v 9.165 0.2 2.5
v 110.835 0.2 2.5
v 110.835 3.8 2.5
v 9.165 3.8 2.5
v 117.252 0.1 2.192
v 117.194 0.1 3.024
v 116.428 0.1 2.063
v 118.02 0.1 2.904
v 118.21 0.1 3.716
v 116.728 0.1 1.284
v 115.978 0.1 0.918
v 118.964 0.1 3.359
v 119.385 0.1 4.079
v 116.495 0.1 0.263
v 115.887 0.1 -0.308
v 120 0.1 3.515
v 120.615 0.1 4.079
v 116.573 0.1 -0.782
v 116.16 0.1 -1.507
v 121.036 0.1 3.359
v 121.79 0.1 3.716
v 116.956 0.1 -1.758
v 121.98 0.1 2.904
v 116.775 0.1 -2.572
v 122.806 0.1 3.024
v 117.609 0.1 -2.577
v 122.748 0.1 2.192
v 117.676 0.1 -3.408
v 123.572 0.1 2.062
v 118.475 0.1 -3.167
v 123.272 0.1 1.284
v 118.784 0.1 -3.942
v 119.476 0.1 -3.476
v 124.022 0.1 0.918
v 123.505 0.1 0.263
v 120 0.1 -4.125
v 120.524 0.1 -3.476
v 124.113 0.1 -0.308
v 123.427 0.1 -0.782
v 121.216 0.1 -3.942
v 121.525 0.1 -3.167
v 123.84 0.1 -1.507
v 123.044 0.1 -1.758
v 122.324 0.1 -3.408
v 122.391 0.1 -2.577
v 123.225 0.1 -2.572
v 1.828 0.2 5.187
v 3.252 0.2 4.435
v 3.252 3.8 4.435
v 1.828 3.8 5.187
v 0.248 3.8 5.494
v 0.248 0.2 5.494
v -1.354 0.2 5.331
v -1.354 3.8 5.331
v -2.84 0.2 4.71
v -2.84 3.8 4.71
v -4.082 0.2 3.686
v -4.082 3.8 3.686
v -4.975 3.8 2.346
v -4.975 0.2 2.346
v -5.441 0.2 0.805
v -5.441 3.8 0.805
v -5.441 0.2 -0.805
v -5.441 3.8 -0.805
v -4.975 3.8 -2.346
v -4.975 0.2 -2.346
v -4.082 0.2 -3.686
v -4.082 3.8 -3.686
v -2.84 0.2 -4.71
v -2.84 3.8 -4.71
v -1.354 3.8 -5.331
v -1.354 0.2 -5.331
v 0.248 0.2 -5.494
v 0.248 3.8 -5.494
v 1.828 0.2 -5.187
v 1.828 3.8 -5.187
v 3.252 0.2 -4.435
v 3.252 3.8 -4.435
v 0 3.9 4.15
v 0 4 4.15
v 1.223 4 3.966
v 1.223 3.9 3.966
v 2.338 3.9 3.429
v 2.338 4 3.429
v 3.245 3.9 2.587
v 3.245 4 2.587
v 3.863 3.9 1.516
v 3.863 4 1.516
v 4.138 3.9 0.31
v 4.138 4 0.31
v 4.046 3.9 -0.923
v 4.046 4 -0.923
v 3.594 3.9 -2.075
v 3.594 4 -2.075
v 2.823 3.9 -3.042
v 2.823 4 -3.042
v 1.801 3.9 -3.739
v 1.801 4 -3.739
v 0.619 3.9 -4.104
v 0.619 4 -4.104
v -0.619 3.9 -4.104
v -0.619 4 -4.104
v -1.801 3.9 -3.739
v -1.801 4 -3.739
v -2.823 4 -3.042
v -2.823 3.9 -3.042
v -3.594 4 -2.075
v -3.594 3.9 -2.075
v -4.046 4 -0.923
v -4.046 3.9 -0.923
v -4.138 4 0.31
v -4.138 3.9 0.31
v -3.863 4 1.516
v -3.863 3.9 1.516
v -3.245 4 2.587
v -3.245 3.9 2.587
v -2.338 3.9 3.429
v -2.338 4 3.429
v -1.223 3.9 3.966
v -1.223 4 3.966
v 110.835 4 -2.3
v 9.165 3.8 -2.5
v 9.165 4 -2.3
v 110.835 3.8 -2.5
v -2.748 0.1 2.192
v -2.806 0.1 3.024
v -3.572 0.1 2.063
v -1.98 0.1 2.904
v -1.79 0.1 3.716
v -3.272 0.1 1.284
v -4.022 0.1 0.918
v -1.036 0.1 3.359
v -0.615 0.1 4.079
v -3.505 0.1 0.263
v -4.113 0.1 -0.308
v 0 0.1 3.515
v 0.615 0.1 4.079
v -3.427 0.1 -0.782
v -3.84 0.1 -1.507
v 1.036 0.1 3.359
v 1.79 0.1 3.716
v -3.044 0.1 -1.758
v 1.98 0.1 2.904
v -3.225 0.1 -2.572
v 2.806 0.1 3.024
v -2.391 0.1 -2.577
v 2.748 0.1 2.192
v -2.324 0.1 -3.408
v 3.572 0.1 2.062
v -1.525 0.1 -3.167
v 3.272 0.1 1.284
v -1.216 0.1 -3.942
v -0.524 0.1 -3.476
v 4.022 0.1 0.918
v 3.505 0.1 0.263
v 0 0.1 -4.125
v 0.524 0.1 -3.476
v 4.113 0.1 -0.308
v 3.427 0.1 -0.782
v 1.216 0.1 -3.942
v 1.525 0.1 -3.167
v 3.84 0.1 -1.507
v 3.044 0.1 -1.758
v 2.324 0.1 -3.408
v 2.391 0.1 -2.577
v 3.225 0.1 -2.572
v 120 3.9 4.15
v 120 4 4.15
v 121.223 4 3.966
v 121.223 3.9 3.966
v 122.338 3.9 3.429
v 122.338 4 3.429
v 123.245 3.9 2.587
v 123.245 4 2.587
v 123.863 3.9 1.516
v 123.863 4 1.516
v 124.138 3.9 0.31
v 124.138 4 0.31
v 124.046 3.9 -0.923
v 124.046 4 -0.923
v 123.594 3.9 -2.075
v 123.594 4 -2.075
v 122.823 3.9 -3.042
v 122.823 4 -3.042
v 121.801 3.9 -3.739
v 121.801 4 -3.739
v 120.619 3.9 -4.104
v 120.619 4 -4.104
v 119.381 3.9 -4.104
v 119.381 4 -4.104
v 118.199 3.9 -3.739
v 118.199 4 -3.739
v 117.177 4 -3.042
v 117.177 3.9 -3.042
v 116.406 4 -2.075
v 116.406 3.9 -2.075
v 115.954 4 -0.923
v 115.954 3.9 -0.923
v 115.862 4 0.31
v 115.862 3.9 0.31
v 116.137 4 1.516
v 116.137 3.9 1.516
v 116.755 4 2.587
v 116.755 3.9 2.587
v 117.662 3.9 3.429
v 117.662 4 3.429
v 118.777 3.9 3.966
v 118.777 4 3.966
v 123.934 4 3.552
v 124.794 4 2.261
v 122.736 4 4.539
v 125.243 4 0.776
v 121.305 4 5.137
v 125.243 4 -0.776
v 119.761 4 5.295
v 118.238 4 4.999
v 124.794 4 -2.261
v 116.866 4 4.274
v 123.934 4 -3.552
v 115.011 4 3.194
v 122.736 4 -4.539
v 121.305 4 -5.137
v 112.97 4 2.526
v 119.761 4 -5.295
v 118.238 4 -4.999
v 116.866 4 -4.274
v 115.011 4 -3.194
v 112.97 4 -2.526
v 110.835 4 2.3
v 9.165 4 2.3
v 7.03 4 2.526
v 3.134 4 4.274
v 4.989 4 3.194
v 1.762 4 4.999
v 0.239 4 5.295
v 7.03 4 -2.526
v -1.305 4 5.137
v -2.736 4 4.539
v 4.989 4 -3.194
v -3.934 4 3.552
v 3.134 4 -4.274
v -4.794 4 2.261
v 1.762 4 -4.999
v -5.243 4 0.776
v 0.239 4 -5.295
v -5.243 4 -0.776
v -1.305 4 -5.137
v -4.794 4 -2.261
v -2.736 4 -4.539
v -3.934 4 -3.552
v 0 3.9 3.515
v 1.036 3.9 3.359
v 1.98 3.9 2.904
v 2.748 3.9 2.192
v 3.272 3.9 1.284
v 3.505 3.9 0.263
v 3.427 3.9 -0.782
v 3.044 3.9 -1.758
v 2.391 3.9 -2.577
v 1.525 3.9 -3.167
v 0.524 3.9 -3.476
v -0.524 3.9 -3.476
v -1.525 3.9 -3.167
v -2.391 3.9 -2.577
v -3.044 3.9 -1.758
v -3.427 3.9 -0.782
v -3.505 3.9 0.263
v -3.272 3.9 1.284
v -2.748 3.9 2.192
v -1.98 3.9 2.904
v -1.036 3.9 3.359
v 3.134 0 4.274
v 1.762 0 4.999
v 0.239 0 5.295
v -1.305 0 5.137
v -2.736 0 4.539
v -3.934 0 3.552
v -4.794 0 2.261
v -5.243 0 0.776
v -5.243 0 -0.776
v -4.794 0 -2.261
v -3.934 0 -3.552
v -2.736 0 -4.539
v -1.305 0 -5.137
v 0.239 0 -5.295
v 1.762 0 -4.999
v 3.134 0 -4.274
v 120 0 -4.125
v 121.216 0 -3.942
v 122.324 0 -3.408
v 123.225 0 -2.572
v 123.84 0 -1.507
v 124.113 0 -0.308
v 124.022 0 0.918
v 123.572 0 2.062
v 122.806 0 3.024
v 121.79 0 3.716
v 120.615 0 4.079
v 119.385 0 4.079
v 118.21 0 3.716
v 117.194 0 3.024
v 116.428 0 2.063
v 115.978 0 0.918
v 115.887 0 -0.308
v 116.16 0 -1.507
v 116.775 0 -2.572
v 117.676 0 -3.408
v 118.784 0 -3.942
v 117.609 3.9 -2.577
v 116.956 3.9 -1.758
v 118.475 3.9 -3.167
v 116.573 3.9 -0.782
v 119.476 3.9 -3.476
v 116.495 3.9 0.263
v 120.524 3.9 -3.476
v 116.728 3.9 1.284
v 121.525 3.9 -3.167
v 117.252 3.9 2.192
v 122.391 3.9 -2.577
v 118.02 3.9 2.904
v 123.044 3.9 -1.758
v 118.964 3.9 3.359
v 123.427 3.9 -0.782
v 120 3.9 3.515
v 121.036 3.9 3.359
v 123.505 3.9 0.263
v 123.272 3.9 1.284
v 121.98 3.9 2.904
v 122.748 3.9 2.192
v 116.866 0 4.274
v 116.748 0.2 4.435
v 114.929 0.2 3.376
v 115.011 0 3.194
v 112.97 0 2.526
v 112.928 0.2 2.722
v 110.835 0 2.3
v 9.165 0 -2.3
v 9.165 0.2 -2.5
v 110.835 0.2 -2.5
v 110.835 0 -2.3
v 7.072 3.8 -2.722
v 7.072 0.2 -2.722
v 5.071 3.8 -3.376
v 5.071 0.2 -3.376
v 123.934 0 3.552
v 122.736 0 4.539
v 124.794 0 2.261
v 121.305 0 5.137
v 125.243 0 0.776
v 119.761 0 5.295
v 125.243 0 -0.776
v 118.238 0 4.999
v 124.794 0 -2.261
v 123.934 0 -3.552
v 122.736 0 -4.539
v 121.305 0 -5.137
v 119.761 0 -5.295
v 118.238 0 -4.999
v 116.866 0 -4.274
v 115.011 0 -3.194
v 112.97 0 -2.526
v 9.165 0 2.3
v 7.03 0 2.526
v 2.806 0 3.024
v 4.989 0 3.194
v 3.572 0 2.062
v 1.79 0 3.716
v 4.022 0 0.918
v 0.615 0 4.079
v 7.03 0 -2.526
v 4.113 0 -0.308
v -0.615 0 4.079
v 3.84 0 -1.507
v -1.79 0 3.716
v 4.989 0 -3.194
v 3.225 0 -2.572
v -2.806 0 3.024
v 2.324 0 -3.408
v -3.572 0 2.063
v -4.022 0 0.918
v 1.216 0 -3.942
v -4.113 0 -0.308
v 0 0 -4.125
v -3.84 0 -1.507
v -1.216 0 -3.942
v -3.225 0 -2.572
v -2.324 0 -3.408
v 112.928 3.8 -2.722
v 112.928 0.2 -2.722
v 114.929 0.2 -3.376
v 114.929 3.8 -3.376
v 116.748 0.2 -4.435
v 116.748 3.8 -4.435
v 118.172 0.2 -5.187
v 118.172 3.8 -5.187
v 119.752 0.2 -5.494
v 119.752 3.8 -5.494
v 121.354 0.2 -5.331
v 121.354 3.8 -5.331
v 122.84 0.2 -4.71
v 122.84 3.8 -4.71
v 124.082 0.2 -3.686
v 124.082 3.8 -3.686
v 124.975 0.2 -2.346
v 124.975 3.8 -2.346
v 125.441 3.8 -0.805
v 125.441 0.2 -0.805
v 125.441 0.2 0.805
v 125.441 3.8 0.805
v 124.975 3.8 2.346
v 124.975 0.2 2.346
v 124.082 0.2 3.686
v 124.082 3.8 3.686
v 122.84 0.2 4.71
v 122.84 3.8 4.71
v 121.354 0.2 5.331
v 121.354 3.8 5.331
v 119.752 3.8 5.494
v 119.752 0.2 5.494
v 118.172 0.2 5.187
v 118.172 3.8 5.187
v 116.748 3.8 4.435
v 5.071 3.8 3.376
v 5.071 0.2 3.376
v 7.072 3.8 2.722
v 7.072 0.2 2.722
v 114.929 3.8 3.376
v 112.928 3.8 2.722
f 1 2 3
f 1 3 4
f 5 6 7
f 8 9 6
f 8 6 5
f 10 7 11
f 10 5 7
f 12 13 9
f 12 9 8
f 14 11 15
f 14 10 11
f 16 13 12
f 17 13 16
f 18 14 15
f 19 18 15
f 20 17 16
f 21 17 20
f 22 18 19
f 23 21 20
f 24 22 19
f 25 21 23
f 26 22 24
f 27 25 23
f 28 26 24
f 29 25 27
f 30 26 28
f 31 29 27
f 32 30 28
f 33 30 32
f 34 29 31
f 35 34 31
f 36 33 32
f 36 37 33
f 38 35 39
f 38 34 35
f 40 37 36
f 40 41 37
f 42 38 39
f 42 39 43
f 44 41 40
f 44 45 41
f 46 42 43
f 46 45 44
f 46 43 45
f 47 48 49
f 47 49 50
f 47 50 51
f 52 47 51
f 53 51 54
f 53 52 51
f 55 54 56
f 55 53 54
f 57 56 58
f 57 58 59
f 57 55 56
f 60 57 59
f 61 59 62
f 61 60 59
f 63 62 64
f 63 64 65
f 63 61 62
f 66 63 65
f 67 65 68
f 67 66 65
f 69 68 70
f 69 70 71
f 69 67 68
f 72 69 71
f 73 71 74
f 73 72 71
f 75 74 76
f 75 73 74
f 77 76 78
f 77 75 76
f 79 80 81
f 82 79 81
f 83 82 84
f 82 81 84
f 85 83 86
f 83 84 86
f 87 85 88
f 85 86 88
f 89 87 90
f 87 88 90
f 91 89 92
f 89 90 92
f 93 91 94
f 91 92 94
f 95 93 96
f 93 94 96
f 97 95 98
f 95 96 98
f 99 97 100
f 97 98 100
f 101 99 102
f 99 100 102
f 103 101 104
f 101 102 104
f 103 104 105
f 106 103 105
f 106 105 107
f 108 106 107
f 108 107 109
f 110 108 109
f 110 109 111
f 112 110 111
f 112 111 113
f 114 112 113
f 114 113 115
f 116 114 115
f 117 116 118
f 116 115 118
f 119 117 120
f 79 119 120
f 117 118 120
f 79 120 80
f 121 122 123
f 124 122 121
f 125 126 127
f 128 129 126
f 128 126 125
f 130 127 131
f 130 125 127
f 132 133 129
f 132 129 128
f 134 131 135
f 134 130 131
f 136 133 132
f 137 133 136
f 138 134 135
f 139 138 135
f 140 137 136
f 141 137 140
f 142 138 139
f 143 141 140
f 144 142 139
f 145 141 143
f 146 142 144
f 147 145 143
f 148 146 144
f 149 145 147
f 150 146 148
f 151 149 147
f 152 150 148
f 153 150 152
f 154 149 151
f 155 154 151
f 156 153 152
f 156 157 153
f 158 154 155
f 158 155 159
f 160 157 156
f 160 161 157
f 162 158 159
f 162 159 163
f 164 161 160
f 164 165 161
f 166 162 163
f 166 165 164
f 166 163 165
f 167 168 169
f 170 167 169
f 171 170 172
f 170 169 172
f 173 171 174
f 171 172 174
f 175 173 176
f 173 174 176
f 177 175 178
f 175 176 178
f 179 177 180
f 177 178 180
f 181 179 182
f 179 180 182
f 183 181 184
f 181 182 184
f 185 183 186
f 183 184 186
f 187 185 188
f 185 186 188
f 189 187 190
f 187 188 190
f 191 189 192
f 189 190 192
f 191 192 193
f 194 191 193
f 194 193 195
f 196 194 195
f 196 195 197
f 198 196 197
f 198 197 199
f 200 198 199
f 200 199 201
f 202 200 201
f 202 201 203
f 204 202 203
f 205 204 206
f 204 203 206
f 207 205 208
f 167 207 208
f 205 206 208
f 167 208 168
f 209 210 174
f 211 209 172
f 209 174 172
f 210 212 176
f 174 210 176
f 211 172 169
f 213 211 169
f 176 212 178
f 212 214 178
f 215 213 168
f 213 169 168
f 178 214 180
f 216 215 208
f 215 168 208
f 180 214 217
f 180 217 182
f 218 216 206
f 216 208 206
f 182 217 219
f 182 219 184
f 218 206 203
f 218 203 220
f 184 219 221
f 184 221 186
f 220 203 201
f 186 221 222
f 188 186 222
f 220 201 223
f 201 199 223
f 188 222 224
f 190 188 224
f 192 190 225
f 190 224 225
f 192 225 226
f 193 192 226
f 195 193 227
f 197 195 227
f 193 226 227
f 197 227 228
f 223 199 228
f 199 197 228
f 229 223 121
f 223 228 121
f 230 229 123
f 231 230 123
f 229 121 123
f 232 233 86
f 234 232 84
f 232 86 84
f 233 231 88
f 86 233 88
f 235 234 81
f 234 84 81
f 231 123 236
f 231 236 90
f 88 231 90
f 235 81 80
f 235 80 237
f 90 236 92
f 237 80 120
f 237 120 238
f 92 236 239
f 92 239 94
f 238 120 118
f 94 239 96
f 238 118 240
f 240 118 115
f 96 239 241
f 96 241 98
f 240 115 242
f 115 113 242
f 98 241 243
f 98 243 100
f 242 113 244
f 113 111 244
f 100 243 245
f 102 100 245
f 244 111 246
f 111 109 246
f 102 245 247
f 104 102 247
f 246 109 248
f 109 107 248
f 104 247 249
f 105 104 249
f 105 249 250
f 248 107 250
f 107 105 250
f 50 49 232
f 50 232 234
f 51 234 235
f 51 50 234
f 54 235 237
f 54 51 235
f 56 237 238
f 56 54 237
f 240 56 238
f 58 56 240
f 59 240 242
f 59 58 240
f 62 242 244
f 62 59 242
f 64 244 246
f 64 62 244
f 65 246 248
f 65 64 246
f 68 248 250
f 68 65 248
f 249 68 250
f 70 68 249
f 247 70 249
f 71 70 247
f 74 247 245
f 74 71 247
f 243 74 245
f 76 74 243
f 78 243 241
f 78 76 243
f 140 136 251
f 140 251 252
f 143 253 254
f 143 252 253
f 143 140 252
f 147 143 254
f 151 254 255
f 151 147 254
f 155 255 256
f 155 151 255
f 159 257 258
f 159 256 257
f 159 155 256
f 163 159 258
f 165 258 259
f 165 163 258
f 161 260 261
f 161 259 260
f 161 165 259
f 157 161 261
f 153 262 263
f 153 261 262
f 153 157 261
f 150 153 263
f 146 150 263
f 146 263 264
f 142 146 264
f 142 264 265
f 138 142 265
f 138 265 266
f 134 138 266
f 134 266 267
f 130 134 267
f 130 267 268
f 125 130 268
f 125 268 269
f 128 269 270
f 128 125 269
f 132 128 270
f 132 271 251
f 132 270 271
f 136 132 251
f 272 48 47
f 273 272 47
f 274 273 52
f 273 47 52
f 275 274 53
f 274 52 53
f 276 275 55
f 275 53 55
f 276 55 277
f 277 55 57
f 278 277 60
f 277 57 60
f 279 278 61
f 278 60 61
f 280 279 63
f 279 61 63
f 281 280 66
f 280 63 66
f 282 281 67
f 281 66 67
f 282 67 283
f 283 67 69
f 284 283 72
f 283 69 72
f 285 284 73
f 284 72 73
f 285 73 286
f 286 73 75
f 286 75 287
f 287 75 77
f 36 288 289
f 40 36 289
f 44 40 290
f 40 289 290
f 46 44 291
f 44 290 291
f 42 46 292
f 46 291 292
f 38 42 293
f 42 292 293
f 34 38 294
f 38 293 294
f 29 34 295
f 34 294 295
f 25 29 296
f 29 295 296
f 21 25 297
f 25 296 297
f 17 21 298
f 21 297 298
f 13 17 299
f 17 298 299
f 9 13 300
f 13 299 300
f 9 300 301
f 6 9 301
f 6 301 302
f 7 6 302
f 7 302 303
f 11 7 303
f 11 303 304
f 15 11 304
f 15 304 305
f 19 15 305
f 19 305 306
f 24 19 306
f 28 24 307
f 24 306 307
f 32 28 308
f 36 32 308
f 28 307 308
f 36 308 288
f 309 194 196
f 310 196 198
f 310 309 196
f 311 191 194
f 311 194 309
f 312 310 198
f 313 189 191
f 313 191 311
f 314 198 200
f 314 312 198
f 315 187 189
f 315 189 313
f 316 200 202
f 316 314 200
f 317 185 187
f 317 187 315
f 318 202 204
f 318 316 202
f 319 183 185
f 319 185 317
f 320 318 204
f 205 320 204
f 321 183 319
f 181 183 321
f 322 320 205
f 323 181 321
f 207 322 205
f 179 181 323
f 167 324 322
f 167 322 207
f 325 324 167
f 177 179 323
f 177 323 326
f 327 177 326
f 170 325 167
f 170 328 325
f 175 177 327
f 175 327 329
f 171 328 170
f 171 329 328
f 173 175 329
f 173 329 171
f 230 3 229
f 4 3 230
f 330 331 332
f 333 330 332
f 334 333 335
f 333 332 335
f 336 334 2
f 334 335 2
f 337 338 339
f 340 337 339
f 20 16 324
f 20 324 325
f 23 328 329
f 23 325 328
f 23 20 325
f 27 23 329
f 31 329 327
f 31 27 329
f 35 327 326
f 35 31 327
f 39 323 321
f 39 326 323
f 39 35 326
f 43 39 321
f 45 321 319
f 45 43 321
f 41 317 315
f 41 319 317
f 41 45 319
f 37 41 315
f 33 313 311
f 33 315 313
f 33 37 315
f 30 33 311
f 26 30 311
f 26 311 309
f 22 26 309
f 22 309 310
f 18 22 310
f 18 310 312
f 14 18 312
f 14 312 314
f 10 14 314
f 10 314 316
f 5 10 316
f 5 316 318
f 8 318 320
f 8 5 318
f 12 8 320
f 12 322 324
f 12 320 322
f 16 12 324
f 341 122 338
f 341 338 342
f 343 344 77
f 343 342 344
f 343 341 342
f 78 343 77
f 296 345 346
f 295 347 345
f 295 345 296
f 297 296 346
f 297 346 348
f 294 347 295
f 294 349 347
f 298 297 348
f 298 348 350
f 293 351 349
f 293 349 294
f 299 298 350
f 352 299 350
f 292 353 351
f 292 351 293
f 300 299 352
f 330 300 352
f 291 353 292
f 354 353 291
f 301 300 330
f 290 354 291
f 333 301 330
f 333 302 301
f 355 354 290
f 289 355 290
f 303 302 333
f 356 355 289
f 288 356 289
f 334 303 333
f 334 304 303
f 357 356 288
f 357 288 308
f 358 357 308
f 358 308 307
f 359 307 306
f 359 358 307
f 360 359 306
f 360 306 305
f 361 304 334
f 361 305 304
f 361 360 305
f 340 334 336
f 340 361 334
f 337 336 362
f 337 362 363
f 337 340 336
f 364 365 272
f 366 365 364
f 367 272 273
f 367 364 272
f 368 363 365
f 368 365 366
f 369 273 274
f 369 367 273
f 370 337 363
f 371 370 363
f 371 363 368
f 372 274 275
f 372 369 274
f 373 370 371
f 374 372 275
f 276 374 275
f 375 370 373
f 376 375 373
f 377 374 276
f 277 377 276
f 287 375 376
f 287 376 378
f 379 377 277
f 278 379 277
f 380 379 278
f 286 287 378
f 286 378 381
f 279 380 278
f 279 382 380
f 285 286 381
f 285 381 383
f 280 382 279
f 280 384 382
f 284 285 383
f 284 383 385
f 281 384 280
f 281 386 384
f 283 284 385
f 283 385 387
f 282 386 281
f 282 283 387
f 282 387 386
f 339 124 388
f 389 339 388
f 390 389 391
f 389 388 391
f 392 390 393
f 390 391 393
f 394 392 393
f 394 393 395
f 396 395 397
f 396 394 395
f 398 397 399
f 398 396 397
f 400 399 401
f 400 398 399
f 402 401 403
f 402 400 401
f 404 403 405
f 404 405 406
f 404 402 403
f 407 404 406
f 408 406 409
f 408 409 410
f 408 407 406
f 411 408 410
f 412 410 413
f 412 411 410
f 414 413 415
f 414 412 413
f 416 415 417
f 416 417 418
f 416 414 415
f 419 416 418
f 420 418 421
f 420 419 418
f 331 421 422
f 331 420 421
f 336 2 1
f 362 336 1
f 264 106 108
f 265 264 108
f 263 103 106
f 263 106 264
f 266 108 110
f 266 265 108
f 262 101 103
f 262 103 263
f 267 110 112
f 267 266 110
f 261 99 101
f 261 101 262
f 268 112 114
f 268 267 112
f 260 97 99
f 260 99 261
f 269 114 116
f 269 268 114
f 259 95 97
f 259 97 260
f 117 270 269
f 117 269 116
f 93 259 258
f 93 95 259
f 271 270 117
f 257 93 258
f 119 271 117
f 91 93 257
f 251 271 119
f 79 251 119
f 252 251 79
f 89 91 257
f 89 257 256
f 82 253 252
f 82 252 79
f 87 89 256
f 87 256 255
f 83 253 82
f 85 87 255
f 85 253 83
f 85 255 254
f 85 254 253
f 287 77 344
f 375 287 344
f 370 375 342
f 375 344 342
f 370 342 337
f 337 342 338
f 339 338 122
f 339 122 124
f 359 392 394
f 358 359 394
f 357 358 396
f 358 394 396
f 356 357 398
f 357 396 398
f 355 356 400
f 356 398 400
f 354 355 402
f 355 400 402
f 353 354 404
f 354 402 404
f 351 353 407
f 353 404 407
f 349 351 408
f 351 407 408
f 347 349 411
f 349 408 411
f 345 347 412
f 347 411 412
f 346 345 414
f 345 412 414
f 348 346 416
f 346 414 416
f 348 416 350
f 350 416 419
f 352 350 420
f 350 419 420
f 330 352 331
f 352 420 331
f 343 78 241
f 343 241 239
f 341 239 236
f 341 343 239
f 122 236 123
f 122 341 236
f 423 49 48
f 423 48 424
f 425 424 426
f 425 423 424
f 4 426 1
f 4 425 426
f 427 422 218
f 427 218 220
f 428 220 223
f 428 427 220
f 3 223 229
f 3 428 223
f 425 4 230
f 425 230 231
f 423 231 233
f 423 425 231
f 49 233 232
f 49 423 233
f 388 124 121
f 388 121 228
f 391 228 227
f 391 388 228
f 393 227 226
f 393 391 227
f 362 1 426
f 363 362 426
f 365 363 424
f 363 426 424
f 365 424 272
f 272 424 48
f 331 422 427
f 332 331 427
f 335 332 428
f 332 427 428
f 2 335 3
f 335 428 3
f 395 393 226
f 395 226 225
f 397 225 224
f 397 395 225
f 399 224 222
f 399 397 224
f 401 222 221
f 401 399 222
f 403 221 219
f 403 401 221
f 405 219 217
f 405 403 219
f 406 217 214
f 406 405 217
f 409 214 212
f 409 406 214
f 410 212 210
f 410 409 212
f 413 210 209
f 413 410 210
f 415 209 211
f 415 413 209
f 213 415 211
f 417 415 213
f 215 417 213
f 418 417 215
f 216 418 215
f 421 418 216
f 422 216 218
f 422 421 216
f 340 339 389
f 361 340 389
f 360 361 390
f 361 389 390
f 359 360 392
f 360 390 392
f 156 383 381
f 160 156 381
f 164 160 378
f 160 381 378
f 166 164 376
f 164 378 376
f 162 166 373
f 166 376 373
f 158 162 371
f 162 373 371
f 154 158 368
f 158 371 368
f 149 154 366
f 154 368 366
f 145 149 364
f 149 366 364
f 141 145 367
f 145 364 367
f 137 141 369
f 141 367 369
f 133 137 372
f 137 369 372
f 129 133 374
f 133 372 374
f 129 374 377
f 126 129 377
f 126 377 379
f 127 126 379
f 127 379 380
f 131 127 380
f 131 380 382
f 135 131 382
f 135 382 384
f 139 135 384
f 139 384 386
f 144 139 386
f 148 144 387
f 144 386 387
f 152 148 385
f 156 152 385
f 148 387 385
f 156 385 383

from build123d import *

# Parameters (mm, degrees)
SKETCH_1_R          = 3.515
EXTRUDE_1_DEPTH     = 4
FILLET_1_R          = 10
CHAMFER_1_SIZE      = 0.2
SKETCH_3_R          = 4.15
CUT_EXTRUDE_2_DEPTH = 0.1
SKETCH_4_R          = 4.125
CUT_EXTRUDE_3_DEPTH = 0.1


with BuildPart() as part:
    # 草图1 → 凸台-拉伸1 (new body)
    with BuildSketch(Plane(origin=(0, 0, 0), x_dir=(1, 0, 0), z_dir=(0, 1, 0))):
        with BuildLine():
            Line((4.898979486, 2.5), (115.101020514, 2.5))
            ThreePointArc((115.101020514, 2.5), (125.5, 0), (115.101020514, -2.5))
            Line((115.101020514, -2.5), (4.898979486, -2.5))
            ThreePointArc((4.898979486, -2.5), (-5.5, 0), (4.898979486, 2.5))
        make_face()
        with Locations(Location((0, 0, 0), (0, 0, 270))):
            Circle(SKETCH_1_R, mode=Mode.SUBTRACT)
        with Locations(Location((120, 0, 0), (0, 0, 270))):
            Circle(SKETCH_1_R, mode=Mode.SUBTRACT)
    extrude(amount=EXTRUDE_1_DEPTH)

    # 圆角1
    fillet_1_edges = [part.edges().sort_by_distance(p)[0] for p in [
        (4.898979486, 2, -2.5),
        (115.101020514, 2, -2.5),
        (115.101020514, 2, 2.5),
        (4.898979486, 2, 2.5),
    ]]
    fillet(fillet_1_edges, radius=FILLET_1_R)

    # 倒角1
    chamfer_1_edges = [part.edges().sort_by_distance(p)[0] for p in [
        (125.5, 0, 0),
        (125.5, 4, 0),
        (60, 0, 2.5),
        (60, 4, 2.5),
        (60, 0, -2.5),
        (60, 4, -2.5),
        (-5.5, 0, 0),
        (-5.5, 4, 0),
        (113.945703694, 0, 2.996180734),
        (113.945703694, 4, 2.996180734),
        (113.945703694, 0, -2.996180734),
        (113.945703694, 4, -2.996180734),
        (6.054296306, 0, 2.996180734),
        (6.054296306, 4, 2.996180734),
        (6.054296306, 0, -2.996180734),
        (6.054296306, 4, -2.996180734),
    ]]
    chamfer(chamfer_1_edges, length=CHAMFER_1_SIZE)

    # 草图3 → 切除-拉伸2 (cut)
    with BuildSketch(Plane(origin=(0, 4, 0), x_dir=(1, 0, 0), z_dir=(0, 1, 0))):
        with Locations(Location((0, 0, 0), (0, 0, 270))):
            Circle(SKETCH_3_R)
        with Locations(Location((120, 0, 0), (0, 0, 270))):
            Circle(SKETCH_3_R)
    extrude(amount=-CUT_EXTRUDE_2_DEPTH, mode=Mode.SUBTRACT)

    # 草图4 → 切除-拉伸3 (cut)
    with BuildSketch(Plane.XZ):
        with Locations(Location((0, 0, 0), (0, 0, 270))):
            Circle(SKETCH_4_R)
        with Locations(Location((120, 0, 0), (0, 0, 270))):
            Circle(SKETCH_4_R)
    extrude(amount=-CUT_EXTRUDE_3_DEPTH, mode=Mode.SUBTRACT)


solid = part.part
